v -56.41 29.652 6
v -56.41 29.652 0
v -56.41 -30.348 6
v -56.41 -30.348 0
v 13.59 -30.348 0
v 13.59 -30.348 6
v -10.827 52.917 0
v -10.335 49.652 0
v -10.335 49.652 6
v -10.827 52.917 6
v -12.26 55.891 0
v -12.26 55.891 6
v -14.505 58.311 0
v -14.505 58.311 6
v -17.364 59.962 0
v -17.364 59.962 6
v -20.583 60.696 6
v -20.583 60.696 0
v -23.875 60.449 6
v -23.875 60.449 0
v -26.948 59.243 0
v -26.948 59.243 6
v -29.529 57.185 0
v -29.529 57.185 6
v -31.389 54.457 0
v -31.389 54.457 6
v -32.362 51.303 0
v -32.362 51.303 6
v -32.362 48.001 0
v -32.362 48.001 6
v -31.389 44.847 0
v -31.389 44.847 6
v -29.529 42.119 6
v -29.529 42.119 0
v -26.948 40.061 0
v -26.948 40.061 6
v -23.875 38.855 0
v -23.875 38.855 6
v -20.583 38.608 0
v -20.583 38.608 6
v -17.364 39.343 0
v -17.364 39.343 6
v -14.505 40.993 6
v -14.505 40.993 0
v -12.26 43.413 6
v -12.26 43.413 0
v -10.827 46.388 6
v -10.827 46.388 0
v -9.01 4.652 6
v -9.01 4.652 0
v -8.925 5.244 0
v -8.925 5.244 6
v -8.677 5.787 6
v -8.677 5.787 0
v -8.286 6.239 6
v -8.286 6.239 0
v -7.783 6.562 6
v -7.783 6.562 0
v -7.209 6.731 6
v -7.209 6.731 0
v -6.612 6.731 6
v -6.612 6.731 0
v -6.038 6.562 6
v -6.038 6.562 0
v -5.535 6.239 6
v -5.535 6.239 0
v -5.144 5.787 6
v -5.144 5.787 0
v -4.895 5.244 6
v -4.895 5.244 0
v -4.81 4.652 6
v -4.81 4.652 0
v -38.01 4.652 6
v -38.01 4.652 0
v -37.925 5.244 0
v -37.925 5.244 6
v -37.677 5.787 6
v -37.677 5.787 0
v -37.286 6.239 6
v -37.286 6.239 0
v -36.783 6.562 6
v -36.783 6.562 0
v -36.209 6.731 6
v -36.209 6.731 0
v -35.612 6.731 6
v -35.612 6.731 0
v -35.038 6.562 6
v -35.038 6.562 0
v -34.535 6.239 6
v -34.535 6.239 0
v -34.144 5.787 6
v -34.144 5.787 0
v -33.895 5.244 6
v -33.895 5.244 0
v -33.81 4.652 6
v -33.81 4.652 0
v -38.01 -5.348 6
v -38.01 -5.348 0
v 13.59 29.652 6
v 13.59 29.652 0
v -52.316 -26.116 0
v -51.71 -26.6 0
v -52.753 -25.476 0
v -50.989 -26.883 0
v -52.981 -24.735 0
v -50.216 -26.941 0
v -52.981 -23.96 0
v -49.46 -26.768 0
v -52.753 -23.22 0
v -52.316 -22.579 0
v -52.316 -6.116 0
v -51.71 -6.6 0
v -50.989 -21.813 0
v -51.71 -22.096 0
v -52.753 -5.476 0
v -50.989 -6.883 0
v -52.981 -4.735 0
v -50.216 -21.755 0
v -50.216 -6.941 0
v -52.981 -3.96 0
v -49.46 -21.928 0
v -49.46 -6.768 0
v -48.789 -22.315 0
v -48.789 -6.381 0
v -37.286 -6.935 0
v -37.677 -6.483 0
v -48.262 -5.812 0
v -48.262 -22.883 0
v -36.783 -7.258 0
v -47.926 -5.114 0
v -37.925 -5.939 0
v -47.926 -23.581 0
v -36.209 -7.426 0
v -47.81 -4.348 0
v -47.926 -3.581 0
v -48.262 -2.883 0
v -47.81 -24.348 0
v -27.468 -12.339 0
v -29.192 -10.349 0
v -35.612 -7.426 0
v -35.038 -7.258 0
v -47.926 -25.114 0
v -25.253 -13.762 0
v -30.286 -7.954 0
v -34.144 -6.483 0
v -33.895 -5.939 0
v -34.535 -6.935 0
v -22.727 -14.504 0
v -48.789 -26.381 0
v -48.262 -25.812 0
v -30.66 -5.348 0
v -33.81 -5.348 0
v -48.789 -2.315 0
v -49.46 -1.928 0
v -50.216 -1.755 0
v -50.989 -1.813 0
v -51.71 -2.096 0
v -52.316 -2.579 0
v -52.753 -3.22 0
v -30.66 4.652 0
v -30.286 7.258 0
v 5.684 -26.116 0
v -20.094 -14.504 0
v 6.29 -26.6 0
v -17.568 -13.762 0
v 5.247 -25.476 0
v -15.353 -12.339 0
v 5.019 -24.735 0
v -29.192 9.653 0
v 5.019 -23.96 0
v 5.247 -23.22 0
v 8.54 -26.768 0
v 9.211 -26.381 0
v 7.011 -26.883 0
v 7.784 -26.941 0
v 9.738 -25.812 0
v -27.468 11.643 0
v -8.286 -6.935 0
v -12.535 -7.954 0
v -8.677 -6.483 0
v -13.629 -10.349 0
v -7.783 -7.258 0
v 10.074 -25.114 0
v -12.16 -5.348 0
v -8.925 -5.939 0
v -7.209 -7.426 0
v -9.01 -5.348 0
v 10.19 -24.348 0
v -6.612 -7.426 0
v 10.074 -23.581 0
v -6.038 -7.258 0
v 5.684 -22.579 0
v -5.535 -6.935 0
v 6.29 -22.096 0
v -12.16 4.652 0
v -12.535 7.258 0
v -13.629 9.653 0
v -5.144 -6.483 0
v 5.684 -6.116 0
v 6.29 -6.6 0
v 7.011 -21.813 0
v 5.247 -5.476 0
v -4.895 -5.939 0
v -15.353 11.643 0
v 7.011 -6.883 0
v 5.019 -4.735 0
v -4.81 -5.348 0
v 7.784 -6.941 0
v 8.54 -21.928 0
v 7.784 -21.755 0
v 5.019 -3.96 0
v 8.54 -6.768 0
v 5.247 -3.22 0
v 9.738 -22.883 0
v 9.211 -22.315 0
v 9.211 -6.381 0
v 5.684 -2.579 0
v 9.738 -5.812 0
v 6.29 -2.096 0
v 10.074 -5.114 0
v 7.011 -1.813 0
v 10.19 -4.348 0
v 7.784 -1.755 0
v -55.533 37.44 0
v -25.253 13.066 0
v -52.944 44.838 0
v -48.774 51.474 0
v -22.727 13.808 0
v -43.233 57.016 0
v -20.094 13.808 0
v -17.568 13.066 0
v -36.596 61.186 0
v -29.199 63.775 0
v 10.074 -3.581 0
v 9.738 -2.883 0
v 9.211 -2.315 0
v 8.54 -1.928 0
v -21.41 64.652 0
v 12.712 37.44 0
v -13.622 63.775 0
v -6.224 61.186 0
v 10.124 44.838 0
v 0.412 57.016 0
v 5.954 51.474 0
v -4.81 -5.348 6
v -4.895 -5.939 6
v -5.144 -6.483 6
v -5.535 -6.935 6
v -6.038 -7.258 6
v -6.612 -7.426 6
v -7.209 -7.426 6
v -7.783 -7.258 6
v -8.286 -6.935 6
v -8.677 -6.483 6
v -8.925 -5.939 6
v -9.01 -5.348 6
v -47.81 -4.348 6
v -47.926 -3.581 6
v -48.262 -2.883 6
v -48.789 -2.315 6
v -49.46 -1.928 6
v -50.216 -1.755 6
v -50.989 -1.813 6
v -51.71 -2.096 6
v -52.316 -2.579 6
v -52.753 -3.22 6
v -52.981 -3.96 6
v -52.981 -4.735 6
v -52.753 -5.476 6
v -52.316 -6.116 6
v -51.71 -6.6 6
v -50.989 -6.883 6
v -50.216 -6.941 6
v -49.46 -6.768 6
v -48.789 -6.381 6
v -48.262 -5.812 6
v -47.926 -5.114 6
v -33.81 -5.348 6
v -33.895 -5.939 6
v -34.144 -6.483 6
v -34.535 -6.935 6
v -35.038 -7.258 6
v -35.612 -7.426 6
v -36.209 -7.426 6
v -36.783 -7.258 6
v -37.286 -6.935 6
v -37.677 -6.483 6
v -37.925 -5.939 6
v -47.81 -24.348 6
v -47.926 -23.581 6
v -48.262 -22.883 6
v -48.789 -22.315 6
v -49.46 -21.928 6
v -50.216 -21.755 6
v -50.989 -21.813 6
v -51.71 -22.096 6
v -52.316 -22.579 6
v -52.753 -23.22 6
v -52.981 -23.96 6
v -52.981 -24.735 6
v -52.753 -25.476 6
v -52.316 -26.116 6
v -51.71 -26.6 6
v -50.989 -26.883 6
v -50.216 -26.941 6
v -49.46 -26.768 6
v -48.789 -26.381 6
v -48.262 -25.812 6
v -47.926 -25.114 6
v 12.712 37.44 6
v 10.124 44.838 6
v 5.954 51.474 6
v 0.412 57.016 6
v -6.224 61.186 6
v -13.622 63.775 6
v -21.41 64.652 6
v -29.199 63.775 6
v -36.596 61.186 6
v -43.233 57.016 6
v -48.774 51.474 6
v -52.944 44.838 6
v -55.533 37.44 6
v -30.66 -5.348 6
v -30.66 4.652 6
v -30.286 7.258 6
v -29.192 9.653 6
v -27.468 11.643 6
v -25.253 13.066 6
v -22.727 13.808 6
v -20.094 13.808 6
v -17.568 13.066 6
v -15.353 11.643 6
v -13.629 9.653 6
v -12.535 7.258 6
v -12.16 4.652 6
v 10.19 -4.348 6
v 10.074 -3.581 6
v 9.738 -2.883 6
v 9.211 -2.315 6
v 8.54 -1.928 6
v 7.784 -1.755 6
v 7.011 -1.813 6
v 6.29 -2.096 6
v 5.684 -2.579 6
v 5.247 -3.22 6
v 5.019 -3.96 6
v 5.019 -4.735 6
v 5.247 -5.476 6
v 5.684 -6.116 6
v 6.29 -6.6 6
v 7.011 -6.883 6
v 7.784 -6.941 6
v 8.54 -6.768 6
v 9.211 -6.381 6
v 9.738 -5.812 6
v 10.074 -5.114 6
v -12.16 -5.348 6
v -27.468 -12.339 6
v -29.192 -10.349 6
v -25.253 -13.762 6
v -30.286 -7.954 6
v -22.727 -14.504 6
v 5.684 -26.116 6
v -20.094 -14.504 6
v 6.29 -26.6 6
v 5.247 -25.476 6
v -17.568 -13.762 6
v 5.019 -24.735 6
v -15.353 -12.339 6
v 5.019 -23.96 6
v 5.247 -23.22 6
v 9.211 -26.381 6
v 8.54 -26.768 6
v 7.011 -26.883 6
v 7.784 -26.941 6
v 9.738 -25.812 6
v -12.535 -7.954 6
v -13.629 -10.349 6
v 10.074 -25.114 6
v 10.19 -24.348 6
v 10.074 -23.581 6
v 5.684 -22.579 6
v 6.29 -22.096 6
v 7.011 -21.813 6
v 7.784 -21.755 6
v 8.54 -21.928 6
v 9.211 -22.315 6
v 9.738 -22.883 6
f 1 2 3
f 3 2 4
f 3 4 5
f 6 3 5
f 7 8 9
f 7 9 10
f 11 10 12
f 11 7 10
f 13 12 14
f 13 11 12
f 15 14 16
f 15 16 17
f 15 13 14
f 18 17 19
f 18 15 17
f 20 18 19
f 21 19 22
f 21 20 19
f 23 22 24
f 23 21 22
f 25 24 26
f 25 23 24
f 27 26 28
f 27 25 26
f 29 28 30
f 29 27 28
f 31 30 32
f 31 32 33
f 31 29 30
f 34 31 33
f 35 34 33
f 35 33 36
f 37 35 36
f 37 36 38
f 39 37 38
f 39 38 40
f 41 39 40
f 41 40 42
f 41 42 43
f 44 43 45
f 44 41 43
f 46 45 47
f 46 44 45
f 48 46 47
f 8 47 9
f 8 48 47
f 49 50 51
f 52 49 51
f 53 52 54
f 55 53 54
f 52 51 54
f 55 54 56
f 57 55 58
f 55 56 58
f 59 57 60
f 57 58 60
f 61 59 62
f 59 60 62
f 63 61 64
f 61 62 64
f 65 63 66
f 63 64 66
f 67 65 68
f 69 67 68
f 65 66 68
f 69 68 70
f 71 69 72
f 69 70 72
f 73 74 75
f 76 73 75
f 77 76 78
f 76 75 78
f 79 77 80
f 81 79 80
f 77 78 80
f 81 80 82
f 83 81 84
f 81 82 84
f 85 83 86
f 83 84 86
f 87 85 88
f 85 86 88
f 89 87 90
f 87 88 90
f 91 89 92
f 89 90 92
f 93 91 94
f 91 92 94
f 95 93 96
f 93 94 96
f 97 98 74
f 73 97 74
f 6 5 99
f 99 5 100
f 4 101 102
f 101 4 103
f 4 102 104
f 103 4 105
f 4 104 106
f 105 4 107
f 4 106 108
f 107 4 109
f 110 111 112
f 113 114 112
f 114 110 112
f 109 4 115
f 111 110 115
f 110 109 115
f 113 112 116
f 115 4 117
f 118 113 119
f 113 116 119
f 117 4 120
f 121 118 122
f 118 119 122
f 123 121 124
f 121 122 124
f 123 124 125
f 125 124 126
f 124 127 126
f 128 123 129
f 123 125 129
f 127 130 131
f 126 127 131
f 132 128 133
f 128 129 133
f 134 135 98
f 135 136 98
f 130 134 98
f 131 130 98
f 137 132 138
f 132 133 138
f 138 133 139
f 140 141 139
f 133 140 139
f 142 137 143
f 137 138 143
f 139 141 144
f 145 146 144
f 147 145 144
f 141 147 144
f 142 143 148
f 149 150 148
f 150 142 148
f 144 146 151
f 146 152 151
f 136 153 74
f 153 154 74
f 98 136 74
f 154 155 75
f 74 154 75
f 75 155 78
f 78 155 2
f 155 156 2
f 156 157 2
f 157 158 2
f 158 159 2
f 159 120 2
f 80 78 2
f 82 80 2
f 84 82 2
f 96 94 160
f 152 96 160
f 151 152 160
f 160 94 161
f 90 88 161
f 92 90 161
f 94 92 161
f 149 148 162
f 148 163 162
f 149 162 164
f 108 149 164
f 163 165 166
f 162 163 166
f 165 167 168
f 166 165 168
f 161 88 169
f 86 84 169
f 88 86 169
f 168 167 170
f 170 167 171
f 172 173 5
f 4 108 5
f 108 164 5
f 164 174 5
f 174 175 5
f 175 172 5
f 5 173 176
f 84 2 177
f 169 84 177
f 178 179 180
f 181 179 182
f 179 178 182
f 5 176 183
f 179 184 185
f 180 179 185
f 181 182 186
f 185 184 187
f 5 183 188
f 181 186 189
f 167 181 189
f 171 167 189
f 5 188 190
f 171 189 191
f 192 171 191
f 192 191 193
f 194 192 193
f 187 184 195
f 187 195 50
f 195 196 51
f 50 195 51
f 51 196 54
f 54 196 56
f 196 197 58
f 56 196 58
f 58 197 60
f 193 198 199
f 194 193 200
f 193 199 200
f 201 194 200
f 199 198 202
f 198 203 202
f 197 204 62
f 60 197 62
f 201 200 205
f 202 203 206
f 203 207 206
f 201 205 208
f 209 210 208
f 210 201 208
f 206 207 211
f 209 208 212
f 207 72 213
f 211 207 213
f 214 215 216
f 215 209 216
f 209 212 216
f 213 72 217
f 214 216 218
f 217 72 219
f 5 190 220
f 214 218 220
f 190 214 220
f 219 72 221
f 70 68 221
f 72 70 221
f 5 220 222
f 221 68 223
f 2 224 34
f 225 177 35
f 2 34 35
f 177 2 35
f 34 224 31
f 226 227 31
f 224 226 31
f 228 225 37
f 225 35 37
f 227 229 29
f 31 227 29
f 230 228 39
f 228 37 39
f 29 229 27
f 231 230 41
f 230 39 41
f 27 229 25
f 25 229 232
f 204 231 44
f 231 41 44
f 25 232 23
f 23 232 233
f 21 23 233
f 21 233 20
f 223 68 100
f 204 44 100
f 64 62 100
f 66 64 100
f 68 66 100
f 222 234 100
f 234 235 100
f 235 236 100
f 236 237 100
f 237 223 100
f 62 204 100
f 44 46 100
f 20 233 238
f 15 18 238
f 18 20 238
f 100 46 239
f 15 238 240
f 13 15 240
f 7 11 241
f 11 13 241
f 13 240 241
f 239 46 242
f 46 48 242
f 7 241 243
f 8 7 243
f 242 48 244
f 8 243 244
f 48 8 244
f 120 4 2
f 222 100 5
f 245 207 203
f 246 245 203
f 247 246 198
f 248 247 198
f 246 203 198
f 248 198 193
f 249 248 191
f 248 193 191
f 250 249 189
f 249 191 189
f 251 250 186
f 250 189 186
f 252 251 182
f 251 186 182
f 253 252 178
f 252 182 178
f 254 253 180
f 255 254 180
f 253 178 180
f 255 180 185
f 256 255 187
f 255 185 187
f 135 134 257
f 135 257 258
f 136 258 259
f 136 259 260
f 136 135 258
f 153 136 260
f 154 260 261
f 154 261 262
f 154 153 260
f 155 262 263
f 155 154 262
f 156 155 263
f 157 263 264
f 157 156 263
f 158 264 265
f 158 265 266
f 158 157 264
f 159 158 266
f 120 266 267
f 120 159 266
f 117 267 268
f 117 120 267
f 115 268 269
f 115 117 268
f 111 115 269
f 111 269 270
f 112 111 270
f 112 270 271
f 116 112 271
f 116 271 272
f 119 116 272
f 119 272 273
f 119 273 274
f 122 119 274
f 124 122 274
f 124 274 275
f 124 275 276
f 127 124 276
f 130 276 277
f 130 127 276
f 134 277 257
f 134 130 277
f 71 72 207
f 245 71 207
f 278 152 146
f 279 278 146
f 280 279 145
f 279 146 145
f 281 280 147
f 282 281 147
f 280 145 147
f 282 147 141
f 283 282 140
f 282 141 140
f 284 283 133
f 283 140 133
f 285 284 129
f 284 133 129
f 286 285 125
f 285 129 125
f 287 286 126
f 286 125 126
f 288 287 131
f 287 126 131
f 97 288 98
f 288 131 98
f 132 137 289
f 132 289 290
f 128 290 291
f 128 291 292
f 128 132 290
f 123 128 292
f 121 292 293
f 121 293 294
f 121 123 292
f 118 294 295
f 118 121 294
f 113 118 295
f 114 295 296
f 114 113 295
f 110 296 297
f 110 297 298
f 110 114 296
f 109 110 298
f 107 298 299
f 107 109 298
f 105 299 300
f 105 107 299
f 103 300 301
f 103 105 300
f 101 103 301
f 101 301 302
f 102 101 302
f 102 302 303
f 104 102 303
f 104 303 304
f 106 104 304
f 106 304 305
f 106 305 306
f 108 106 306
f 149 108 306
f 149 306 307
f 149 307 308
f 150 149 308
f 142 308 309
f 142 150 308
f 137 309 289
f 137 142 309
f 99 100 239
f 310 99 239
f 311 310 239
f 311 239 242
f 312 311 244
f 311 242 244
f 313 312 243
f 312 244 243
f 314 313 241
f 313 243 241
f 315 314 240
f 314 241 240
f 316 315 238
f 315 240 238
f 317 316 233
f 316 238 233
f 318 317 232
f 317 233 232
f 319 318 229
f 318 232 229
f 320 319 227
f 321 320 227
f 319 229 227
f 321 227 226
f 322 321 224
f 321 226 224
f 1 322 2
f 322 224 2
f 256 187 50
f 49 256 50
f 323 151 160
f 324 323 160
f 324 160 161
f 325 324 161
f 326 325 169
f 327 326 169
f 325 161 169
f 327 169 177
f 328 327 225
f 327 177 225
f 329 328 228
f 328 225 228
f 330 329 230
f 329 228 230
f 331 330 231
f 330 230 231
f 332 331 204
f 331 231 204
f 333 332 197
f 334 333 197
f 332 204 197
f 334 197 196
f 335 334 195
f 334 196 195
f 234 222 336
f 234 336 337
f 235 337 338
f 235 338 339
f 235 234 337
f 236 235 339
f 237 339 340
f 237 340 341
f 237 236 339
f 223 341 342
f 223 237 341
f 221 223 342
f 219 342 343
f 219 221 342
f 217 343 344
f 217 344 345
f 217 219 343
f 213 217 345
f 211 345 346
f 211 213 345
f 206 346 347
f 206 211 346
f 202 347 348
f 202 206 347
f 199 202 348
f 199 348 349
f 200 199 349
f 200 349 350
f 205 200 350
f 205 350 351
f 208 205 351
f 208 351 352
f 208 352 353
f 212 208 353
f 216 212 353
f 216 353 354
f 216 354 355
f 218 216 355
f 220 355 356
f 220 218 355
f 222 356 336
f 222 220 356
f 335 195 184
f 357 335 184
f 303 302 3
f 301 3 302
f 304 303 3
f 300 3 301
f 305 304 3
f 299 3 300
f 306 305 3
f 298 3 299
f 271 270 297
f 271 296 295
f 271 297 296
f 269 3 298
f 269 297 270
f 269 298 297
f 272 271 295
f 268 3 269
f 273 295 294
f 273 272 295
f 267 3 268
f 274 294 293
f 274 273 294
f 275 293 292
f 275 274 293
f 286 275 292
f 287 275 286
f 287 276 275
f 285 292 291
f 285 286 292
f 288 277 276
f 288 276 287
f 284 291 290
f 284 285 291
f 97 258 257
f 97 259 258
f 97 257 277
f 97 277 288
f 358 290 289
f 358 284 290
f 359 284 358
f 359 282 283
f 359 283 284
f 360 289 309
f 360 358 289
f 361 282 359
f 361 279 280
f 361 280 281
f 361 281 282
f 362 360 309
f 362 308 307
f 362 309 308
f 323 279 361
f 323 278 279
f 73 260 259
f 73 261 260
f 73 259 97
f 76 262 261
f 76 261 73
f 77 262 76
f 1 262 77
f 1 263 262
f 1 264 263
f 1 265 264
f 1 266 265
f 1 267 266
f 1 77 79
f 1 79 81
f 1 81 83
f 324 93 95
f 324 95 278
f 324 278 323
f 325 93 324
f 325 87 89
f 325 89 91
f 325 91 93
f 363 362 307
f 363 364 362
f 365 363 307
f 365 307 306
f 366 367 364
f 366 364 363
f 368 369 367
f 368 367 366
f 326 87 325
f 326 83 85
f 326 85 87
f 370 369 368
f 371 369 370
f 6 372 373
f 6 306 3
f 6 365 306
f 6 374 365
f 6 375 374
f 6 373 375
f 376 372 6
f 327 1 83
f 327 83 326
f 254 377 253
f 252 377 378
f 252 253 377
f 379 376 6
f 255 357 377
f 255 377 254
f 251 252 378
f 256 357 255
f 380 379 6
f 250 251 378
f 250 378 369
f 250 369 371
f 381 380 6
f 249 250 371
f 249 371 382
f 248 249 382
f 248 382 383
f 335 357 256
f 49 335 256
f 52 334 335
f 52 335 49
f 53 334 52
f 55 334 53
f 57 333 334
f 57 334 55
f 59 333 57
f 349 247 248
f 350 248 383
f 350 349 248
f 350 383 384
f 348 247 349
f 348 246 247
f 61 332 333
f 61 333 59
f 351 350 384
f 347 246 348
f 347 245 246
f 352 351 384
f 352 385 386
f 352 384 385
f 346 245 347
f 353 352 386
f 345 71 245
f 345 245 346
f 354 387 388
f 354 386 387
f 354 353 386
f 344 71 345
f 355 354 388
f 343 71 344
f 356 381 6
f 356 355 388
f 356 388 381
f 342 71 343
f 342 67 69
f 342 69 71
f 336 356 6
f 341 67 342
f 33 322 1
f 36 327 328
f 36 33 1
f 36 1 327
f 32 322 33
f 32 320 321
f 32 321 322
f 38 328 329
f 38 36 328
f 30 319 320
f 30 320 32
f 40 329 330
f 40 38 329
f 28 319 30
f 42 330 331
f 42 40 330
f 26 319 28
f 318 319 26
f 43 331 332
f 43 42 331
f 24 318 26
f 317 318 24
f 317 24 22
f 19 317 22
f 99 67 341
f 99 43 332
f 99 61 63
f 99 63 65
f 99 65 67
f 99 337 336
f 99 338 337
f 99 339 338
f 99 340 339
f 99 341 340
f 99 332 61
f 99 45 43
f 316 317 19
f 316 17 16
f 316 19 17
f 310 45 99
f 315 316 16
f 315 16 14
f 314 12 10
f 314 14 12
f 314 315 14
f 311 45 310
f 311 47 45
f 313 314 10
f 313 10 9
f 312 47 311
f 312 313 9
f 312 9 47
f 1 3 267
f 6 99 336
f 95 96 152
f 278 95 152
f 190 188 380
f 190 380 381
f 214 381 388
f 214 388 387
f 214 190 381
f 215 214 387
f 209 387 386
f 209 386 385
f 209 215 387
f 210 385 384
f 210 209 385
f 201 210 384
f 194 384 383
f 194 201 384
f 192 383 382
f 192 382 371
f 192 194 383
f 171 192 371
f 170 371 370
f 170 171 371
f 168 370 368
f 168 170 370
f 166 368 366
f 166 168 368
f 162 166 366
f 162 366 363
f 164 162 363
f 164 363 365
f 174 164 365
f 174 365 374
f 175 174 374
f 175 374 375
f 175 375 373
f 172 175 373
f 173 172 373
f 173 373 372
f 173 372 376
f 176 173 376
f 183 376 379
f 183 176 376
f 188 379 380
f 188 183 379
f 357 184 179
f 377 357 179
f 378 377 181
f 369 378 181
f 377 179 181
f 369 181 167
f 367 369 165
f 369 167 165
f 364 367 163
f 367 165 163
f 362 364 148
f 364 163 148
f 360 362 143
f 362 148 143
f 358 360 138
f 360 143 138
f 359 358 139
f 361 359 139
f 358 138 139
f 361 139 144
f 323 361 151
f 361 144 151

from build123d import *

# Parameters (mm, degrees)
IZIM1_R                     = 11.075
IZIM1_R_2                   = 2.6
Y_KSEKLIK_EKSTR_ZYON2_DEPTH = 6


with BuildPart() as part:
    # Çizim1 → Yükseklik-Ekstrüzyon2 (new body)
    with BuildSketch(Plane.XY):
        with BuildLine():
            Line((-56.410377678, 29.652139902), (-56.410377678, -30.347860098))
            Line((-56.410377678, -30.347860098), (13.589622322, -30.347860098))
            Line((13.589622322, -30.347860098), (13.589622322, 29.652139902))
            ThreePointArc((13.589622322, 29.652139902), (-21.410377678, 64.652139902), (-56.410377678, 29.652139902))
        make_face()
        with Locations((-21.410377678, 49.652139902)):
            Circle(IZIM1_R, mode=Mode.SUBTRACT)
        with Locations((-50.410377678, -24.347860098)):
            Circle(IZIM1_R_2, mode=Mode.SUBTRACT)
        with Locations((7.589622322, -24.347860098)):
            Circle(IZIM1_R_2, mode=Mode.SUBTRACT)
        with Locations((-50.410377678, -4.347860098)):
            Circle(IZIM1_R_2, mode=Mode.SUBTRACT)
        with Locations((7.589622322, -4.347860098)):
            Circle(IZIM1_R_2, mode=Mode.SUBTRACT)
        with BuildLine():
            Line((-12.160377678, 4.652139902), (-12.160377678, -5.347860098))
            ThreePointArc((-12.160377678, -5.347860098), (-21.410377678, -14.597860098), (-30.660377678, -5.347860098))
            Line((-30.660377678, -5.347860098), (-30.660377678, 4.652139902))
            ThreePointArc((-30.660377678, 4.652139902), (-21.410377678, 13.902139902), (-12.160377678, 4.652139902))
        make_face(mode=Mode.SUBTRACT)
        with BuildLine():
            Line((-33.810377678, 4.652139902), (-33.810377678, -5.347860098))
            ThreePointArc((-33.810377678, -5.347860098), (-35.910377678, -7.447860098), (-38.010377678, -5.347860098))
            Line((-38.010377678, -5.347860098), (-38.010377678, 4.652139902))
            ThreePointArc((-38.010377678, 4.652139902), (-35.910377678, 6.752139902), (-33.810377678, 4.652139902))
        make_face(mode=Mode.SUBTRACT)
        with BuildLine():
            Line((-4.810377678, 4.652139902), (-4.810377678, -5.347860098))
            ThreePointArc((-4.810377678, -5.347860098), (-6.910377678, -7.447860098), (-9.010377678, -5.347860098))
            Line((-9.010377678, -5.347860098), (-9.010377678, 4.652139902))
            ThreePointArc((-9.010377678, 4.652139902), (-6.910377678, 6.752139902), (-4.810377678, 4.652139902))
        make_face(mode=Mode.SUBTRACT)
    extrude(amount=Y_KSEKLIK_EKSTR_ZYON2_DEPTH)


solid = part.part
